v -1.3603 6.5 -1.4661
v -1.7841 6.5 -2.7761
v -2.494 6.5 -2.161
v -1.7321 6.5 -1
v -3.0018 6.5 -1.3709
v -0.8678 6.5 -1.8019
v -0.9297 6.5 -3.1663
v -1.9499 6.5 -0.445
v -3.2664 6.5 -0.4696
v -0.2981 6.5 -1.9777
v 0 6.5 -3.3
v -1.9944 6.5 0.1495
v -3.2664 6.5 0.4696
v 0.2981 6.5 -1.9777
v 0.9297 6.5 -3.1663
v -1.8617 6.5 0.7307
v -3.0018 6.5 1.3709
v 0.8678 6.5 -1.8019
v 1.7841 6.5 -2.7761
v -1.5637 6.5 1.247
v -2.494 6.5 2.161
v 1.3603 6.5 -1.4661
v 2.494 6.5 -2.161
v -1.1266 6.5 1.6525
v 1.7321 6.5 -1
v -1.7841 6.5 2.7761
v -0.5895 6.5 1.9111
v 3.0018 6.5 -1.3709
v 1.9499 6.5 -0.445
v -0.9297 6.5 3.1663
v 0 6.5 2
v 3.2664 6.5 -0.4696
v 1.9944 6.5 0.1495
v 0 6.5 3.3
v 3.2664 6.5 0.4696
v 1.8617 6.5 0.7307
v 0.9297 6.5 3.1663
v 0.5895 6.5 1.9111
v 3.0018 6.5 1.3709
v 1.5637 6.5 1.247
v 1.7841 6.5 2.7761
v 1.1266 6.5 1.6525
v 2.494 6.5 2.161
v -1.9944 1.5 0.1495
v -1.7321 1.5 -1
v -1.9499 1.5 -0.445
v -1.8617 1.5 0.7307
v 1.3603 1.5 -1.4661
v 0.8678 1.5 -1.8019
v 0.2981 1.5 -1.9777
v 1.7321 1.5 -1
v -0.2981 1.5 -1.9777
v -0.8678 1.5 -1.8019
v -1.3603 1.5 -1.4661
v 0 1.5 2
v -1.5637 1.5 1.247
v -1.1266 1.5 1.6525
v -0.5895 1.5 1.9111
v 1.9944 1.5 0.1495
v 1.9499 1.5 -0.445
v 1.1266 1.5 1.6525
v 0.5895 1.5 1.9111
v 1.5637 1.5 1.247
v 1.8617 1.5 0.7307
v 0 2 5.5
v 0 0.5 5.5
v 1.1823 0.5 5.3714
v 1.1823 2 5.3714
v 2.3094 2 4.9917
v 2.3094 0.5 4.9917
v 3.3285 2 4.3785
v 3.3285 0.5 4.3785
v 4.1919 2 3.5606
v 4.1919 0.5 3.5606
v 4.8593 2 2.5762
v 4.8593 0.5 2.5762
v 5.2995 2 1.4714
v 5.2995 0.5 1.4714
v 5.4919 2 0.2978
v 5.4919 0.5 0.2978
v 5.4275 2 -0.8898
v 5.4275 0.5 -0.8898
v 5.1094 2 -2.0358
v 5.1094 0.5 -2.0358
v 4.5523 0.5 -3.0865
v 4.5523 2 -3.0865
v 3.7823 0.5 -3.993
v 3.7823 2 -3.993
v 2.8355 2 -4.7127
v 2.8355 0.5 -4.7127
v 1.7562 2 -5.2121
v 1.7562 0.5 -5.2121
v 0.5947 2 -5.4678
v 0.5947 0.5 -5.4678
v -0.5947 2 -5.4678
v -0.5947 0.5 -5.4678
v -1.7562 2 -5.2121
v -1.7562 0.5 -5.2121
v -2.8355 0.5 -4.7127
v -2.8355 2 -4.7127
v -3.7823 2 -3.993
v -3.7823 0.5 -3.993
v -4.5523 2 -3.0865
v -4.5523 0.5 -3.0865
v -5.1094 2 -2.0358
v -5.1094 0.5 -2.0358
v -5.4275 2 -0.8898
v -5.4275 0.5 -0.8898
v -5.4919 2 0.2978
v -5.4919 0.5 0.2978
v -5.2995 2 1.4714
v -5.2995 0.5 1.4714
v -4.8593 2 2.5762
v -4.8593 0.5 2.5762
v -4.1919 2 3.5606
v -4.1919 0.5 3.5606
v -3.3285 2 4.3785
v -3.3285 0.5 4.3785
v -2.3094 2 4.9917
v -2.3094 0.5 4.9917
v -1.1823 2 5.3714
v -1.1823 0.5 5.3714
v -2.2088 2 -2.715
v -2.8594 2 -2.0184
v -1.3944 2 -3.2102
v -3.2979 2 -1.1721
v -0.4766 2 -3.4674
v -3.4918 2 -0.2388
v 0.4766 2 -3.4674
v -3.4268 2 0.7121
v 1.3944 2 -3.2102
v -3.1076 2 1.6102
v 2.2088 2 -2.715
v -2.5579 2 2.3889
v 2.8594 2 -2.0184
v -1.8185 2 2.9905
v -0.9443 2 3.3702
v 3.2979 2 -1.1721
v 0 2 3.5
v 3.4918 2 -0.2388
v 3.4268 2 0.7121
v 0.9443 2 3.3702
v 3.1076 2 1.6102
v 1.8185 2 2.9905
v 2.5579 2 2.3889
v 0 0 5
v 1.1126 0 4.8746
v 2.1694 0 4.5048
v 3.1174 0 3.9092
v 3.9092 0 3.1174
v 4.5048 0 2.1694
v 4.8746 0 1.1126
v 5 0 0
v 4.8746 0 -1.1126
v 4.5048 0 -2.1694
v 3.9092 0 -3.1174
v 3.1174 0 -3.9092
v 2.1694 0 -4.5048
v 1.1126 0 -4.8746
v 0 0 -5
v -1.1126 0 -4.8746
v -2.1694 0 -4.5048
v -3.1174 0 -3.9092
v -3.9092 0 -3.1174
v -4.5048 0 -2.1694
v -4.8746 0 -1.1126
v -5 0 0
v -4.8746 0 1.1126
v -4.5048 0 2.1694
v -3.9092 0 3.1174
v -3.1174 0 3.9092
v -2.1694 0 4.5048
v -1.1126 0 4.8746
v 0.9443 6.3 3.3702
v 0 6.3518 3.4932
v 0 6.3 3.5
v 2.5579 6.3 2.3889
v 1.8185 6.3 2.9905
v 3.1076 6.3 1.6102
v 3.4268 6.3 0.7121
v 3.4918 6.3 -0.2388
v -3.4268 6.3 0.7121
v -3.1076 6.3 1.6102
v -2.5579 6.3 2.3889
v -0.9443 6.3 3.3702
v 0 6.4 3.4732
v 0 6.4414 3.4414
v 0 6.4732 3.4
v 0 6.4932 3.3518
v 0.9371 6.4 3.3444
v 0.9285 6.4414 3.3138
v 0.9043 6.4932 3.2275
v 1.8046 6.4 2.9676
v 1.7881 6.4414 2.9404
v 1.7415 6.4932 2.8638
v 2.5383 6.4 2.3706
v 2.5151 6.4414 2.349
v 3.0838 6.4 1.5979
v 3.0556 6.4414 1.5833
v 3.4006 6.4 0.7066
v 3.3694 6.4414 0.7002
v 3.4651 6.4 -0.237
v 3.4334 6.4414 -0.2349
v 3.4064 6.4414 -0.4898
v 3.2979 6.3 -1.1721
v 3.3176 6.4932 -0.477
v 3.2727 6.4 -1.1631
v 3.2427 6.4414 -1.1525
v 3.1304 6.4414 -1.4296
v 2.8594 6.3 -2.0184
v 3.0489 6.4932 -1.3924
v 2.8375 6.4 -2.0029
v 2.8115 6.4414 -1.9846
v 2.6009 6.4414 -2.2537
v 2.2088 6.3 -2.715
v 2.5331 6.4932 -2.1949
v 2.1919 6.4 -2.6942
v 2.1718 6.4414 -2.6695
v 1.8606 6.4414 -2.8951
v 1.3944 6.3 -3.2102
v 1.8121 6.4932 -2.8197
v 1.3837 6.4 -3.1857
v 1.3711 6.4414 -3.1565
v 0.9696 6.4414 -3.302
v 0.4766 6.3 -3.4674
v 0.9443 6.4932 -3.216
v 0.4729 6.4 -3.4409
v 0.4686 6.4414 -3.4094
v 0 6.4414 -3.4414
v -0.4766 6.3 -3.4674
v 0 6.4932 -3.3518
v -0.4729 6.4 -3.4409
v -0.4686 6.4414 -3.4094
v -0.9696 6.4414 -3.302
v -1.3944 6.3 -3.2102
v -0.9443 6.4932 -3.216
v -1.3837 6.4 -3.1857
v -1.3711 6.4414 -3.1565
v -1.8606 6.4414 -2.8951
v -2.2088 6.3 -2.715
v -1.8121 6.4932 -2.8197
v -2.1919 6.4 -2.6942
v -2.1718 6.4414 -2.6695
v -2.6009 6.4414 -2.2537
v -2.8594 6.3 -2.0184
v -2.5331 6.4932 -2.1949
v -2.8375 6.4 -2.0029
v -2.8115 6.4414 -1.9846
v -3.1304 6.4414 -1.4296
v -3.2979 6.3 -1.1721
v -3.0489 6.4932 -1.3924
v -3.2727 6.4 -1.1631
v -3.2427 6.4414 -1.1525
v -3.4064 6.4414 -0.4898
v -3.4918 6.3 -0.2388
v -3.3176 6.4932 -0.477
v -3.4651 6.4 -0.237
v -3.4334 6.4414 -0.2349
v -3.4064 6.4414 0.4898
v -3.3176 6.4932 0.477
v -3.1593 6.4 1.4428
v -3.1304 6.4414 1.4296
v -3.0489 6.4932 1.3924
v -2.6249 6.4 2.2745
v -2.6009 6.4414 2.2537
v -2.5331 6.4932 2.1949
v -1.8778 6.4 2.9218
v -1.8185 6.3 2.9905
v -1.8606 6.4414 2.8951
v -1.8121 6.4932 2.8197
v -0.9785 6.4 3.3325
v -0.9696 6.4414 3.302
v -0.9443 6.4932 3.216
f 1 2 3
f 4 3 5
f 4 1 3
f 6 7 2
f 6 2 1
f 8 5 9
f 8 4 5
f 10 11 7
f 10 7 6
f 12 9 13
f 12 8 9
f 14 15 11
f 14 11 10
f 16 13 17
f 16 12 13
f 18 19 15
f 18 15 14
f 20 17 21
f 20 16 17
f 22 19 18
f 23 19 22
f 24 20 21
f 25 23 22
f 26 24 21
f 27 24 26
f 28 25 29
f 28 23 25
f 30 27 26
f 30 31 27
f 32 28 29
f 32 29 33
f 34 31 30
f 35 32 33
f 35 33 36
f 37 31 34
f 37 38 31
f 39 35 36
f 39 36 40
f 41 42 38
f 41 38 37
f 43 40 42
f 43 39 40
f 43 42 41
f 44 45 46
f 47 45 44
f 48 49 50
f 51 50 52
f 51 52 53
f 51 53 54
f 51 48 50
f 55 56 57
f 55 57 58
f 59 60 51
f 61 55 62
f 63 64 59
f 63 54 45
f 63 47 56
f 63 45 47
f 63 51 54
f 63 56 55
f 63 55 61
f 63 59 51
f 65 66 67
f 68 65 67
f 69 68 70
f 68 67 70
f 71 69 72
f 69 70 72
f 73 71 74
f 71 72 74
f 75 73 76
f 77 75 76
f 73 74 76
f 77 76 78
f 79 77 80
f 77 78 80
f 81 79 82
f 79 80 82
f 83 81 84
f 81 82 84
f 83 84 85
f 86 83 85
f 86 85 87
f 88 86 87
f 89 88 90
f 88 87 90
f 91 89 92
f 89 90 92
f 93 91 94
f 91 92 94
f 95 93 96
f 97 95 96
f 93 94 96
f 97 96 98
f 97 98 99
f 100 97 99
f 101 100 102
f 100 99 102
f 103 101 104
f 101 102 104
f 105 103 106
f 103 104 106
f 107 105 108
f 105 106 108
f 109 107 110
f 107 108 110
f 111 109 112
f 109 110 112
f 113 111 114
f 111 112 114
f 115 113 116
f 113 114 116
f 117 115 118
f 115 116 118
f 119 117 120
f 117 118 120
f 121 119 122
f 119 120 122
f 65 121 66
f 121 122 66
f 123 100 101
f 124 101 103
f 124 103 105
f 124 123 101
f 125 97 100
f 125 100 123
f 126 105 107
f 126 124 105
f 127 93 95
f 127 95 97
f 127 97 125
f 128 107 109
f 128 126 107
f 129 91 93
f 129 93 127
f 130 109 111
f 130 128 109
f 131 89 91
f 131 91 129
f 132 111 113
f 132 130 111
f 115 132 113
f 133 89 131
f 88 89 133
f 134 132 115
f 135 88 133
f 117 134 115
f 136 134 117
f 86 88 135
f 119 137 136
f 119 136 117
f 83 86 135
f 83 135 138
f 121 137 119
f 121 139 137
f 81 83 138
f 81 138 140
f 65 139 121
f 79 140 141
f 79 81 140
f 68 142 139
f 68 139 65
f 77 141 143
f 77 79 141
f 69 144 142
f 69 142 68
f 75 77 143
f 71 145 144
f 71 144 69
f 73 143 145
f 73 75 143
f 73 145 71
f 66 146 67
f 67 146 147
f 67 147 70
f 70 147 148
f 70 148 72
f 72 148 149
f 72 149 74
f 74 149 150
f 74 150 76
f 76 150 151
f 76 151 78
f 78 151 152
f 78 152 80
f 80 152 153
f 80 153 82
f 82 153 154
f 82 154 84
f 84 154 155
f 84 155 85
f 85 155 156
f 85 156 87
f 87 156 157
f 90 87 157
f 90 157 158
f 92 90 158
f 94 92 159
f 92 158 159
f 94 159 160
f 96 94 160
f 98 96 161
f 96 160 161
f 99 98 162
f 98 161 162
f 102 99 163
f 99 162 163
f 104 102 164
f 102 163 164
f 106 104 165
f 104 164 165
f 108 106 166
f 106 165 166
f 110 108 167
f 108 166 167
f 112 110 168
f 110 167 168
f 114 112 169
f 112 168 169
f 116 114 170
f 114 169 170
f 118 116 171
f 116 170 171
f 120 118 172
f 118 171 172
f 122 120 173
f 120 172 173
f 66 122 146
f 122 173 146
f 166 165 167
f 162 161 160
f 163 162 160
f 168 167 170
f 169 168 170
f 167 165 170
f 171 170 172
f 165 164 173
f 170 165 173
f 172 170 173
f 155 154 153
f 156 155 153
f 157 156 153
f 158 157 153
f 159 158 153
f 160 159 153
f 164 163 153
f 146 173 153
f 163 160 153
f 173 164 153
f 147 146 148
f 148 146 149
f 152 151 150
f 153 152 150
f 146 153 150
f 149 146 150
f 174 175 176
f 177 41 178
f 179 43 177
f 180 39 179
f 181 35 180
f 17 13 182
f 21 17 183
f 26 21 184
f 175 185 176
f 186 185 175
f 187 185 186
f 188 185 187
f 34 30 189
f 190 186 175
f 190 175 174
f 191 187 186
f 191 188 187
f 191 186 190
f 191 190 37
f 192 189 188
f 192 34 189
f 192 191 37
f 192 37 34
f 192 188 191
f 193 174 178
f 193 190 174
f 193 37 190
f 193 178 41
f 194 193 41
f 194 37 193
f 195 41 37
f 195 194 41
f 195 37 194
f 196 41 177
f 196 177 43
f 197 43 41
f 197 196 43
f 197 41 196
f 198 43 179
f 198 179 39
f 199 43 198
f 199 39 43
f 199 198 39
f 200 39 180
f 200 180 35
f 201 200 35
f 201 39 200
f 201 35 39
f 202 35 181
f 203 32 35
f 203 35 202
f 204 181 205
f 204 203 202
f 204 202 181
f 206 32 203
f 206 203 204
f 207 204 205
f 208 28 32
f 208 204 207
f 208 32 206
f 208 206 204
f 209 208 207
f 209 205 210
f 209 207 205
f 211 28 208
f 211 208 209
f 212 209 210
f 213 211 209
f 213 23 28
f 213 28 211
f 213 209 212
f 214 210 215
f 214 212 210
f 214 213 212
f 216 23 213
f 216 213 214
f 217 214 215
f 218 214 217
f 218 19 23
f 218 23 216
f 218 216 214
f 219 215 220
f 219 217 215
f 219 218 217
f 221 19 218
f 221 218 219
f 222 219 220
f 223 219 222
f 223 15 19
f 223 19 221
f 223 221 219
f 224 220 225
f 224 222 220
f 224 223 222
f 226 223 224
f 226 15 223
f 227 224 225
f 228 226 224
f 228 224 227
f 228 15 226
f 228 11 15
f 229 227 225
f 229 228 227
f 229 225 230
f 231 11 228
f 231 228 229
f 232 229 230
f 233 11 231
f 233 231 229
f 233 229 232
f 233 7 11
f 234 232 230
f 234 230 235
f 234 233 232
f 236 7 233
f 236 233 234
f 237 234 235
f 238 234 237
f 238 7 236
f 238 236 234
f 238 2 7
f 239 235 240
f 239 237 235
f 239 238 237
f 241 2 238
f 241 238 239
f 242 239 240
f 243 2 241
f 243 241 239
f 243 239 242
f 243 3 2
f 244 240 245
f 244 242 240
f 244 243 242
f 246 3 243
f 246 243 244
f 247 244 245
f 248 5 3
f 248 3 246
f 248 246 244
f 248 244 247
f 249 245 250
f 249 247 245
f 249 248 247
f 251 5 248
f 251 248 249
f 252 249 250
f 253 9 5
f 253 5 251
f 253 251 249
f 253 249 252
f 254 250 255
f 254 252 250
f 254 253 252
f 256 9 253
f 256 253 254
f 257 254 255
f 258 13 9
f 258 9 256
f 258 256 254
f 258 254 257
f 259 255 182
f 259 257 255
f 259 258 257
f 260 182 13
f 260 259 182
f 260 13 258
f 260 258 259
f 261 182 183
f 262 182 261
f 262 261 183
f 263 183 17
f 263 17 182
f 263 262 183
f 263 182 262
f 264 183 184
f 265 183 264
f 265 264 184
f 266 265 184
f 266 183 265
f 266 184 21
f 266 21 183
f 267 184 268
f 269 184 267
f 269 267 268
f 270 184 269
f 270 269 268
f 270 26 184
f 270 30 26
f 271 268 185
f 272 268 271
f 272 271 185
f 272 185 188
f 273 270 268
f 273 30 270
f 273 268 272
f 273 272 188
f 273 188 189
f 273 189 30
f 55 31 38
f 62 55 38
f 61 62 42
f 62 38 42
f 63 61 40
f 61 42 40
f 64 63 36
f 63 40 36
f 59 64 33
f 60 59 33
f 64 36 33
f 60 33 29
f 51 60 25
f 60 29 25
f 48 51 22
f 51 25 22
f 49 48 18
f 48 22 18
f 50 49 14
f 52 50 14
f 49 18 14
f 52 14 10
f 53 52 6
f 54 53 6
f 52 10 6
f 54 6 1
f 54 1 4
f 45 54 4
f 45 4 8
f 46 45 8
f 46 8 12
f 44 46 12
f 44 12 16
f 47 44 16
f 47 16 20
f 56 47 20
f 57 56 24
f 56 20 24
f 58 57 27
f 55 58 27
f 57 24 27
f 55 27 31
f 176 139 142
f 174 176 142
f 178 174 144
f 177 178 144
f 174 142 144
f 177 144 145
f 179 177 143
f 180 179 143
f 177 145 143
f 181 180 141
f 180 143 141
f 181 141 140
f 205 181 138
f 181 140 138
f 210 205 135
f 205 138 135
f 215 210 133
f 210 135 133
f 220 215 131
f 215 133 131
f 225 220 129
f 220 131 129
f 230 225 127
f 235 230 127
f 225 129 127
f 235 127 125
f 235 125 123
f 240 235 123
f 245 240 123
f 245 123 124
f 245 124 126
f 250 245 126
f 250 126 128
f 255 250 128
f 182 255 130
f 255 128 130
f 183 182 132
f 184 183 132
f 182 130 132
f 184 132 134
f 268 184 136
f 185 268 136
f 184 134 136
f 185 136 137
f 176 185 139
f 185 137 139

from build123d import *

# Parameters (mm, degrees)
SKETCH_1_R          = 5.5
EXTRUDE_1_DEPTH     = 2
SKETCH_2_R          = 3.5
EXTRUDE_2_DEPTH     = 4.5
SKETCH_3_R          = 2
CUT_EXTRUDE_1_DEPTH = 5
CHAMFER_1_SIZE      = 0.5
FILLET_1_R          = 0.2


with BuildPart() as part:
    # 草图1 → 凸台-拉伸1 (new body)
    with BuildSketch(Plane(origin=(0, 0, 0), x_dir=(1, 0, 0), z_dir=(0, 1, 0))):
        with Locations(Location((0, 0, 0), (0, 0, 270))):
            Circle(SKETCH_1_R)
    extrude(amount=EXTRUDE_1_DEPTH)

    # 草图2 → 凸台-拉伸2 (add)
    with BuildSketch(Plane(origin=(0, 2, 0), x_dir=(1, 0, 0), z_dir=(0, 1, 0))):
        with Locations(Location((0, 0, 0), (0, 0, 270))):
            Circle(SKETCH_2_R)
    extrude(amount=EXTRUDE_2_DEPTH)

    # 草图3 → 切除-拉伸1 (cut)
    with BuildSketch(Plane(origin=(0, 6.5, 0), x_dir=(1, 0, 0), z_dir=(0, 1, 0))):
        with Locations(Location((0, 0, 0), (0, 0, 270))):
            Circle(SKETCH_3_R)
    extrude(amount=-CUT_EXTRUDE_1_DEPTH, mode=Mode.SUBTRACT)

    # 倒角1
    chamfer_1_edges = [part.edges().sort_by_distance(p)[0] for p in [
        (0, 0, -5.5),
    ]]
    chamfer(chamfer_1_edges, length=CHAMFER_1_SIZE)

    # 圆角1
    fillet_1_edges = [part.edges().sort_by_distance(p)[0] for p in [
        (0, 6.5, -3.5),
    ]]
    fillet(fillet_1_edges, radius=FILLET_1_R)


solid = part.part
